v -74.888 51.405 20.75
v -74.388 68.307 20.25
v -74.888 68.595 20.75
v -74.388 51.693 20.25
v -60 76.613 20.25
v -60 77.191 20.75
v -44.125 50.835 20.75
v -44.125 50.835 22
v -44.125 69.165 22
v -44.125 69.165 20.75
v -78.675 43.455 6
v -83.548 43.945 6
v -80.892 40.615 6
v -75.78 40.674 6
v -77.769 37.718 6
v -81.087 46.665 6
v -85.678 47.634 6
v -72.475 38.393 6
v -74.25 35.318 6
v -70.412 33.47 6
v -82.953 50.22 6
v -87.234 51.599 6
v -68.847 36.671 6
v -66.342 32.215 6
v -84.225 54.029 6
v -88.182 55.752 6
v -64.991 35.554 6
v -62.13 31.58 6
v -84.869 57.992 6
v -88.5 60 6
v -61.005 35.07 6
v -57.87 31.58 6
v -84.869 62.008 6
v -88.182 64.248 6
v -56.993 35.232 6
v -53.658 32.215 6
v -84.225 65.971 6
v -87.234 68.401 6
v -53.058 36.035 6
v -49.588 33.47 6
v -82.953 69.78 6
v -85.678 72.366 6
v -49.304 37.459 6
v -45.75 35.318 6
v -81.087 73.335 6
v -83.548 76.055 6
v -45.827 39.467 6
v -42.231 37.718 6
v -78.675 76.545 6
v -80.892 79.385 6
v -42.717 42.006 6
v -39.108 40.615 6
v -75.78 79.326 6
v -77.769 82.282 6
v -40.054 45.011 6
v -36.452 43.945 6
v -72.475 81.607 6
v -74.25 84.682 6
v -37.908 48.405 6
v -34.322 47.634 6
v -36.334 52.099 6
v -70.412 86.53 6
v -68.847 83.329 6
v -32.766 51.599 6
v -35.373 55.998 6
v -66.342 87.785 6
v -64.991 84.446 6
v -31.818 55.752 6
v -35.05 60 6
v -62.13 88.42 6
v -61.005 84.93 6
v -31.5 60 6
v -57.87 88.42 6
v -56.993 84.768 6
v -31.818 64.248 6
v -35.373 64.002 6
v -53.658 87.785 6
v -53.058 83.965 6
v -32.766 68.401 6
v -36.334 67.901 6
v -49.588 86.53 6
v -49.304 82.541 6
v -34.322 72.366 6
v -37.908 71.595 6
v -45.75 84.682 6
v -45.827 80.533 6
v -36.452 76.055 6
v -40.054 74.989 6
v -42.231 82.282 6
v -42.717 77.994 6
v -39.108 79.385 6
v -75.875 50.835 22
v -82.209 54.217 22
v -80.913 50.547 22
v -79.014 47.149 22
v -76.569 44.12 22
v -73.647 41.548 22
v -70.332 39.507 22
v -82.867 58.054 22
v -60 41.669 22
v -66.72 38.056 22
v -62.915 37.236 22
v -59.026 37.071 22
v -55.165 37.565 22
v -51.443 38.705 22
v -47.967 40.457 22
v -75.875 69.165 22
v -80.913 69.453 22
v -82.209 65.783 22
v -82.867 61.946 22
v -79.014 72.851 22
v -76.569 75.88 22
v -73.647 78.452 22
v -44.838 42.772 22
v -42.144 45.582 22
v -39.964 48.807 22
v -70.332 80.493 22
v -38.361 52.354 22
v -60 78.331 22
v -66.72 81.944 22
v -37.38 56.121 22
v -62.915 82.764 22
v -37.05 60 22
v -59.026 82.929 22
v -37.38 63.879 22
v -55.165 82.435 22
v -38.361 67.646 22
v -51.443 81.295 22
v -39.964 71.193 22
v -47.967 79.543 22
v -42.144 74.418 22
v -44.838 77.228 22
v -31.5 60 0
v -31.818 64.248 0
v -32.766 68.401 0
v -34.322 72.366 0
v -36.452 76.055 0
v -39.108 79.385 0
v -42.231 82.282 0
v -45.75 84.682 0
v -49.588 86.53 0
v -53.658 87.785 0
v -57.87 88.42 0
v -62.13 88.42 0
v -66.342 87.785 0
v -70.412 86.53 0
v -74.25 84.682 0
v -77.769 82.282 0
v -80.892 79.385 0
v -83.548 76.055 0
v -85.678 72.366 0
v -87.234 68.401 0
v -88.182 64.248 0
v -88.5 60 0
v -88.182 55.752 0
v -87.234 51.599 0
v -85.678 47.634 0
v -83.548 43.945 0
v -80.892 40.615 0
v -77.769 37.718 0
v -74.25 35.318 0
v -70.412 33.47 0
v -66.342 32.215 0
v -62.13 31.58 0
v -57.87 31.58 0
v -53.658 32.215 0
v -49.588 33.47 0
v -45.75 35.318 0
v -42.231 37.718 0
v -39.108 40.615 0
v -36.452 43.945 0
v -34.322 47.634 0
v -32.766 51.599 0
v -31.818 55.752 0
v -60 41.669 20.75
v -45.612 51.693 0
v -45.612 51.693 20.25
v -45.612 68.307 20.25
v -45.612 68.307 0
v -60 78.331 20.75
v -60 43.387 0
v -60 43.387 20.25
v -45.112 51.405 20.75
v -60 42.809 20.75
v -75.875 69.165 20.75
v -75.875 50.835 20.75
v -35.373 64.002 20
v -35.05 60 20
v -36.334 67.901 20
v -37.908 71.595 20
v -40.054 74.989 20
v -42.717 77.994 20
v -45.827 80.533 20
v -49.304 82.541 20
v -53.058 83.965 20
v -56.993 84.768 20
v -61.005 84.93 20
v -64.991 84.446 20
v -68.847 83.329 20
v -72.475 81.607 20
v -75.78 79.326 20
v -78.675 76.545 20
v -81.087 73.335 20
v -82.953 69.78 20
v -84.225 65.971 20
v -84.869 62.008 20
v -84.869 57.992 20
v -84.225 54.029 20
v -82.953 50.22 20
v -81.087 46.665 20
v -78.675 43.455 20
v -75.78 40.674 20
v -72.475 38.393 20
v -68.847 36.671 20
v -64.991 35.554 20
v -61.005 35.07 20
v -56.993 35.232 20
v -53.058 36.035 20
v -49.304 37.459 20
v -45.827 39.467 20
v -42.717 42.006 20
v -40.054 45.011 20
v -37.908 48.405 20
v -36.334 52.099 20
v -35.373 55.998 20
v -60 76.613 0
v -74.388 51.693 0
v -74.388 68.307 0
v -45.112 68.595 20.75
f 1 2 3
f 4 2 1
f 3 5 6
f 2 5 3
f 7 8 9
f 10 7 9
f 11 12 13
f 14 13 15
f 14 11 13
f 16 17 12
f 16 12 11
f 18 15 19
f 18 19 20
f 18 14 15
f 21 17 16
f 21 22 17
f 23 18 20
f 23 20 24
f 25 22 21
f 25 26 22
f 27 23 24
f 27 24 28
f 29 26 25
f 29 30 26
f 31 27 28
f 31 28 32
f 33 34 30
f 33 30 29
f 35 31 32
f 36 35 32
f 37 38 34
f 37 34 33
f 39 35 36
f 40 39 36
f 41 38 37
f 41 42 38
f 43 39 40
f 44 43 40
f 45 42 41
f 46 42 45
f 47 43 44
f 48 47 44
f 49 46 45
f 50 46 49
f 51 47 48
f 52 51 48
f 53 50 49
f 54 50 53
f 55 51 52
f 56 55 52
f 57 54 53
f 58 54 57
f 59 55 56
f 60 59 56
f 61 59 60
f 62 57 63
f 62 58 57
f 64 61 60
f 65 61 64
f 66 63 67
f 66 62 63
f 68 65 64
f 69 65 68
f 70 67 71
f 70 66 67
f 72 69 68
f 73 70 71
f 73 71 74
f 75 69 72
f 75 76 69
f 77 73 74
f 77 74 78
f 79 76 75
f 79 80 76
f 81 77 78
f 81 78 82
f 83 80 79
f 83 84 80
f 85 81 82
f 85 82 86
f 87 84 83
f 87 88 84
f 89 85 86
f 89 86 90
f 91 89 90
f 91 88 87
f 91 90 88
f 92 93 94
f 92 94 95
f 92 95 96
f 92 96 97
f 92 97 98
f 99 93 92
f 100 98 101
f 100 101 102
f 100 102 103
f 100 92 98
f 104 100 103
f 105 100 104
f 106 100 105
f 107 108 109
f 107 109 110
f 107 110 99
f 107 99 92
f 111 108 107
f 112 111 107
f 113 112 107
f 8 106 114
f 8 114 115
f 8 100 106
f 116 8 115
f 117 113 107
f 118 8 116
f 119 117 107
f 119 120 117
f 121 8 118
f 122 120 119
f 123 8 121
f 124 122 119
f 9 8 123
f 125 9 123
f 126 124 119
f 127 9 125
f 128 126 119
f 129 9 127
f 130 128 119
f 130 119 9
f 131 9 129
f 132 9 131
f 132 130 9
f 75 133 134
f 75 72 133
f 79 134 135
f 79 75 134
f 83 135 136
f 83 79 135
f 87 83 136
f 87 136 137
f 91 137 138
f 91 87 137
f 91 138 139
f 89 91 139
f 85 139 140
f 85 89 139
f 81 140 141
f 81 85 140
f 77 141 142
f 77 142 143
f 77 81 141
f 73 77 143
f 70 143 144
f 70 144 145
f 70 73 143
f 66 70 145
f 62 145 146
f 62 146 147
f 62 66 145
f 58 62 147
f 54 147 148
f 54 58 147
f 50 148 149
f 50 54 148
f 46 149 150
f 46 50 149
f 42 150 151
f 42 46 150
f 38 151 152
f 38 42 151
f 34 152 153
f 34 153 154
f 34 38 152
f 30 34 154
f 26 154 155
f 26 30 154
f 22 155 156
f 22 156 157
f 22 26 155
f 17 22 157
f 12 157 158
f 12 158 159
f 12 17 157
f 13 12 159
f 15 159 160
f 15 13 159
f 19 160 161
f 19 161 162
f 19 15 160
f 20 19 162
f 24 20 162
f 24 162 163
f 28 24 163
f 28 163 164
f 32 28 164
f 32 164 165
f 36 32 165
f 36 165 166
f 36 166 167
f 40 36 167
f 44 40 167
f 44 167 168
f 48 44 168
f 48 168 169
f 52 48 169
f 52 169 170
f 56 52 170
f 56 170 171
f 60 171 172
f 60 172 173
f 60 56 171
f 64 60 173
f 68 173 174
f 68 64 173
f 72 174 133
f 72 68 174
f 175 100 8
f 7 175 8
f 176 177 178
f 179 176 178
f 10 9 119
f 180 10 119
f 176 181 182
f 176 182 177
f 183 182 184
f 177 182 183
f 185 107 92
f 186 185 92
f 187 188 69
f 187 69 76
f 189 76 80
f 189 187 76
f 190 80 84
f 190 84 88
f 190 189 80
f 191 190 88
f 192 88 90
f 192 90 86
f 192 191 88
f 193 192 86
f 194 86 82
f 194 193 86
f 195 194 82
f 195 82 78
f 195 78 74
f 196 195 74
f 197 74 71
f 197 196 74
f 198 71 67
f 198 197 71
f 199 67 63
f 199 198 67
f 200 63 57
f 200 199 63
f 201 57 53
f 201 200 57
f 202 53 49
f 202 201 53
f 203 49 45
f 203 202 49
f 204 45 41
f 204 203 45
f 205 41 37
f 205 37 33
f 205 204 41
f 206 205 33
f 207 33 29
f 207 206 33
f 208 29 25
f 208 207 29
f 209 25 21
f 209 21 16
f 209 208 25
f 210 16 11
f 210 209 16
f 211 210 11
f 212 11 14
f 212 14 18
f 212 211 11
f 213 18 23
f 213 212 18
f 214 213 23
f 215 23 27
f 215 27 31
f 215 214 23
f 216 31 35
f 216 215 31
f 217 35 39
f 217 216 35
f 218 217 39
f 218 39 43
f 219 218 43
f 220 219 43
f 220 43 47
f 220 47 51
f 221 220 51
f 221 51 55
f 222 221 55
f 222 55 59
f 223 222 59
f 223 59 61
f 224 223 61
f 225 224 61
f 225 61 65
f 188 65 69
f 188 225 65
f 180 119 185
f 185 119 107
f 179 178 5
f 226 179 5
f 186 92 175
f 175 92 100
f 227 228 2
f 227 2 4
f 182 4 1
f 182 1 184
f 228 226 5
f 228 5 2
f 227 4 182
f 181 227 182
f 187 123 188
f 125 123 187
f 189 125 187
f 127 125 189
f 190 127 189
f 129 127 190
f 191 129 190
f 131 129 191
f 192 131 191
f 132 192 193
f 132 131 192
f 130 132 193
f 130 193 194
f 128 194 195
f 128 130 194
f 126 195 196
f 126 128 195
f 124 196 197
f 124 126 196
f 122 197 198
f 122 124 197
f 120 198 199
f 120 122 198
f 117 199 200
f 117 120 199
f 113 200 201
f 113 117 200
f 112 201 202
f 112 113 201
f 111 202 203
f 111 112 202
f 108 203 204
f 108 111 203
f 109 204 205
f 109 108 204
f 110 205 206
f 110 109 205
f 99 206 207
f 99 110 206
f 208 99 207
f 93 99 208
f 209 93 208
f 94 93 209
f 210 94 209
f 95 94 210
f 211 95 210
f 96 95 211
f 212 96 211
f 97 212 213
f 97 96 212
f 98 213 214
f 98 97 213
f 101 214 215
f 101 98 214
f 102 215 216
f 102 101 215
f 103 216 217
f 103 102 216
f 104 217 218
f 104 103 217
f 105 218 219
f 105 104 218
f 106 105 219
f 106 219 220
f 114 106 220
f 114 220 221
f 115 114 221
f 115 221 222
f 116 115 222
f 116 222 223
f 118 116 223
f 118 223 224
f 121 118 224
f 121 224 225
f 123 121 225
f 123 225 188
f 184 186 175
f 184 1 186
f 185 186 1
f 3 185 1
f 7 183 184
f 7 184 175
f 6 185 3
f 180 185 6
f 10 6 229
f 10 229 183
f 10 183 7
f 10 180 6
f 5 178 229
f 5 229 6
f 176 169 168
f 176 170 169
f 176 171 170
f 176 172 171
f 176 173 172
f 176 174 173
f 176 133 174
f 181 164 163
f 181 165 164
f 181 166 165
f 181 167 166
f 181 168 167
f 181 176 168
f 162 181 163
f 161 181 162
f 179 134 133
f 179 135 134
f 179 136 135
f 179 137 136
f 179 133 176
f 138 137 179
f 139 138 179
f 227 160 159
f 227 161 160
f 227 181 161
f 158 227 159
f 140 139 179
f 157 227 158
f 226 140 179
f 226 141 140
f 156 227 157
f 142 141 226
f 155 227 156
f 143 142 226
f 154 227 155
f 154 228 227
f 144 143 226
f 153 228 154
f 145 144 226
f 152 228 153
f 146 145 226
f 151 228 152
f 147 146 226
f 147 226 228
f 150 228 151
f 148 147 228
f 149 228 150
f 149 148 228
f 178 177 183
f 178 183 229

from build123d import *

# Parameters (mm, degrees)
POCKET023_DEPTH = 22.001
POCKET024_DEPTH = 1.25
CHAMFER_SIZE    = 2
CHAMFER001_SIZE = 0.5


with BuildPart() as part:
    # Sketch032 (on XZ_Plane051 of Origin102) → Revolution010 (revolve)
    with BuildSketch(Plane.XZ):
        Polygon((0, 0), (28.5, 0), (28.5, 6), (24.95, 6), (24.95, 22), (0, 22), align=None)
    revolve(axis=Axis((0, 0, 0), (0, 0, 1)))

    # Sketch033 (on XY_Plane051 of Origin102) → Pocket023 (cut, through all)
    with BuildSketch(Plane.XY):
        Polygon((14.3875, 8.306627), (0, 16.613254), (-14.3875, 8.306627), (-14.3875, -8.306627), (0, -16.613254), (14.3875, -8.306627), align=None)
    extrude(amount=POCKET023_DEPTH, mode=Mode.SUBTRACT)

    # Sketch034 (on XY_Plane051 of Origin102) → Pocket024 (cut)
    with BuildSketch(Plane.XY.offset(22)):
        Polygon((15.875, -9.165436), (15.875, 9.165436), (0, 18.330871), (-15.875, 9.165436), (-15.875, -9.165436), (0, -18.330871), align=None)
    extrude(amount=-POCKET024_DEPTH, mode=Mode.SUBTRACT)

    # Chamfer
    chamfer_edges = [part.edges().sort_by_distance(p)[0] for p in [
        (-24.95, 0, 22),
    ]]
    chamfer(chamfer_edges, length=CHAMFER_SIZE)

    # Chamfer001
    chamfer001_edges = [part.edges().sort_by_distance(p)[0] for p in [
        (-14.3875, 0, 20.75),
        (-7.19375, 12.45994, 20.75),
        (7.19375, 12.45994, 20.75),
        (14.3875, 0, 20.75),
        (7.19375, -12.45994, 20.75),
        (-7.19375, -12.45994, 20.75),
    ]]
    chamfer(chamfer001_edges, length=CHAMFER001_SIZE)


with BuildPart() as part_1:
    # Body055 placement: moved
    add(part.part.moved(Location((-60, 60, 0))))


solid = part_1.part
